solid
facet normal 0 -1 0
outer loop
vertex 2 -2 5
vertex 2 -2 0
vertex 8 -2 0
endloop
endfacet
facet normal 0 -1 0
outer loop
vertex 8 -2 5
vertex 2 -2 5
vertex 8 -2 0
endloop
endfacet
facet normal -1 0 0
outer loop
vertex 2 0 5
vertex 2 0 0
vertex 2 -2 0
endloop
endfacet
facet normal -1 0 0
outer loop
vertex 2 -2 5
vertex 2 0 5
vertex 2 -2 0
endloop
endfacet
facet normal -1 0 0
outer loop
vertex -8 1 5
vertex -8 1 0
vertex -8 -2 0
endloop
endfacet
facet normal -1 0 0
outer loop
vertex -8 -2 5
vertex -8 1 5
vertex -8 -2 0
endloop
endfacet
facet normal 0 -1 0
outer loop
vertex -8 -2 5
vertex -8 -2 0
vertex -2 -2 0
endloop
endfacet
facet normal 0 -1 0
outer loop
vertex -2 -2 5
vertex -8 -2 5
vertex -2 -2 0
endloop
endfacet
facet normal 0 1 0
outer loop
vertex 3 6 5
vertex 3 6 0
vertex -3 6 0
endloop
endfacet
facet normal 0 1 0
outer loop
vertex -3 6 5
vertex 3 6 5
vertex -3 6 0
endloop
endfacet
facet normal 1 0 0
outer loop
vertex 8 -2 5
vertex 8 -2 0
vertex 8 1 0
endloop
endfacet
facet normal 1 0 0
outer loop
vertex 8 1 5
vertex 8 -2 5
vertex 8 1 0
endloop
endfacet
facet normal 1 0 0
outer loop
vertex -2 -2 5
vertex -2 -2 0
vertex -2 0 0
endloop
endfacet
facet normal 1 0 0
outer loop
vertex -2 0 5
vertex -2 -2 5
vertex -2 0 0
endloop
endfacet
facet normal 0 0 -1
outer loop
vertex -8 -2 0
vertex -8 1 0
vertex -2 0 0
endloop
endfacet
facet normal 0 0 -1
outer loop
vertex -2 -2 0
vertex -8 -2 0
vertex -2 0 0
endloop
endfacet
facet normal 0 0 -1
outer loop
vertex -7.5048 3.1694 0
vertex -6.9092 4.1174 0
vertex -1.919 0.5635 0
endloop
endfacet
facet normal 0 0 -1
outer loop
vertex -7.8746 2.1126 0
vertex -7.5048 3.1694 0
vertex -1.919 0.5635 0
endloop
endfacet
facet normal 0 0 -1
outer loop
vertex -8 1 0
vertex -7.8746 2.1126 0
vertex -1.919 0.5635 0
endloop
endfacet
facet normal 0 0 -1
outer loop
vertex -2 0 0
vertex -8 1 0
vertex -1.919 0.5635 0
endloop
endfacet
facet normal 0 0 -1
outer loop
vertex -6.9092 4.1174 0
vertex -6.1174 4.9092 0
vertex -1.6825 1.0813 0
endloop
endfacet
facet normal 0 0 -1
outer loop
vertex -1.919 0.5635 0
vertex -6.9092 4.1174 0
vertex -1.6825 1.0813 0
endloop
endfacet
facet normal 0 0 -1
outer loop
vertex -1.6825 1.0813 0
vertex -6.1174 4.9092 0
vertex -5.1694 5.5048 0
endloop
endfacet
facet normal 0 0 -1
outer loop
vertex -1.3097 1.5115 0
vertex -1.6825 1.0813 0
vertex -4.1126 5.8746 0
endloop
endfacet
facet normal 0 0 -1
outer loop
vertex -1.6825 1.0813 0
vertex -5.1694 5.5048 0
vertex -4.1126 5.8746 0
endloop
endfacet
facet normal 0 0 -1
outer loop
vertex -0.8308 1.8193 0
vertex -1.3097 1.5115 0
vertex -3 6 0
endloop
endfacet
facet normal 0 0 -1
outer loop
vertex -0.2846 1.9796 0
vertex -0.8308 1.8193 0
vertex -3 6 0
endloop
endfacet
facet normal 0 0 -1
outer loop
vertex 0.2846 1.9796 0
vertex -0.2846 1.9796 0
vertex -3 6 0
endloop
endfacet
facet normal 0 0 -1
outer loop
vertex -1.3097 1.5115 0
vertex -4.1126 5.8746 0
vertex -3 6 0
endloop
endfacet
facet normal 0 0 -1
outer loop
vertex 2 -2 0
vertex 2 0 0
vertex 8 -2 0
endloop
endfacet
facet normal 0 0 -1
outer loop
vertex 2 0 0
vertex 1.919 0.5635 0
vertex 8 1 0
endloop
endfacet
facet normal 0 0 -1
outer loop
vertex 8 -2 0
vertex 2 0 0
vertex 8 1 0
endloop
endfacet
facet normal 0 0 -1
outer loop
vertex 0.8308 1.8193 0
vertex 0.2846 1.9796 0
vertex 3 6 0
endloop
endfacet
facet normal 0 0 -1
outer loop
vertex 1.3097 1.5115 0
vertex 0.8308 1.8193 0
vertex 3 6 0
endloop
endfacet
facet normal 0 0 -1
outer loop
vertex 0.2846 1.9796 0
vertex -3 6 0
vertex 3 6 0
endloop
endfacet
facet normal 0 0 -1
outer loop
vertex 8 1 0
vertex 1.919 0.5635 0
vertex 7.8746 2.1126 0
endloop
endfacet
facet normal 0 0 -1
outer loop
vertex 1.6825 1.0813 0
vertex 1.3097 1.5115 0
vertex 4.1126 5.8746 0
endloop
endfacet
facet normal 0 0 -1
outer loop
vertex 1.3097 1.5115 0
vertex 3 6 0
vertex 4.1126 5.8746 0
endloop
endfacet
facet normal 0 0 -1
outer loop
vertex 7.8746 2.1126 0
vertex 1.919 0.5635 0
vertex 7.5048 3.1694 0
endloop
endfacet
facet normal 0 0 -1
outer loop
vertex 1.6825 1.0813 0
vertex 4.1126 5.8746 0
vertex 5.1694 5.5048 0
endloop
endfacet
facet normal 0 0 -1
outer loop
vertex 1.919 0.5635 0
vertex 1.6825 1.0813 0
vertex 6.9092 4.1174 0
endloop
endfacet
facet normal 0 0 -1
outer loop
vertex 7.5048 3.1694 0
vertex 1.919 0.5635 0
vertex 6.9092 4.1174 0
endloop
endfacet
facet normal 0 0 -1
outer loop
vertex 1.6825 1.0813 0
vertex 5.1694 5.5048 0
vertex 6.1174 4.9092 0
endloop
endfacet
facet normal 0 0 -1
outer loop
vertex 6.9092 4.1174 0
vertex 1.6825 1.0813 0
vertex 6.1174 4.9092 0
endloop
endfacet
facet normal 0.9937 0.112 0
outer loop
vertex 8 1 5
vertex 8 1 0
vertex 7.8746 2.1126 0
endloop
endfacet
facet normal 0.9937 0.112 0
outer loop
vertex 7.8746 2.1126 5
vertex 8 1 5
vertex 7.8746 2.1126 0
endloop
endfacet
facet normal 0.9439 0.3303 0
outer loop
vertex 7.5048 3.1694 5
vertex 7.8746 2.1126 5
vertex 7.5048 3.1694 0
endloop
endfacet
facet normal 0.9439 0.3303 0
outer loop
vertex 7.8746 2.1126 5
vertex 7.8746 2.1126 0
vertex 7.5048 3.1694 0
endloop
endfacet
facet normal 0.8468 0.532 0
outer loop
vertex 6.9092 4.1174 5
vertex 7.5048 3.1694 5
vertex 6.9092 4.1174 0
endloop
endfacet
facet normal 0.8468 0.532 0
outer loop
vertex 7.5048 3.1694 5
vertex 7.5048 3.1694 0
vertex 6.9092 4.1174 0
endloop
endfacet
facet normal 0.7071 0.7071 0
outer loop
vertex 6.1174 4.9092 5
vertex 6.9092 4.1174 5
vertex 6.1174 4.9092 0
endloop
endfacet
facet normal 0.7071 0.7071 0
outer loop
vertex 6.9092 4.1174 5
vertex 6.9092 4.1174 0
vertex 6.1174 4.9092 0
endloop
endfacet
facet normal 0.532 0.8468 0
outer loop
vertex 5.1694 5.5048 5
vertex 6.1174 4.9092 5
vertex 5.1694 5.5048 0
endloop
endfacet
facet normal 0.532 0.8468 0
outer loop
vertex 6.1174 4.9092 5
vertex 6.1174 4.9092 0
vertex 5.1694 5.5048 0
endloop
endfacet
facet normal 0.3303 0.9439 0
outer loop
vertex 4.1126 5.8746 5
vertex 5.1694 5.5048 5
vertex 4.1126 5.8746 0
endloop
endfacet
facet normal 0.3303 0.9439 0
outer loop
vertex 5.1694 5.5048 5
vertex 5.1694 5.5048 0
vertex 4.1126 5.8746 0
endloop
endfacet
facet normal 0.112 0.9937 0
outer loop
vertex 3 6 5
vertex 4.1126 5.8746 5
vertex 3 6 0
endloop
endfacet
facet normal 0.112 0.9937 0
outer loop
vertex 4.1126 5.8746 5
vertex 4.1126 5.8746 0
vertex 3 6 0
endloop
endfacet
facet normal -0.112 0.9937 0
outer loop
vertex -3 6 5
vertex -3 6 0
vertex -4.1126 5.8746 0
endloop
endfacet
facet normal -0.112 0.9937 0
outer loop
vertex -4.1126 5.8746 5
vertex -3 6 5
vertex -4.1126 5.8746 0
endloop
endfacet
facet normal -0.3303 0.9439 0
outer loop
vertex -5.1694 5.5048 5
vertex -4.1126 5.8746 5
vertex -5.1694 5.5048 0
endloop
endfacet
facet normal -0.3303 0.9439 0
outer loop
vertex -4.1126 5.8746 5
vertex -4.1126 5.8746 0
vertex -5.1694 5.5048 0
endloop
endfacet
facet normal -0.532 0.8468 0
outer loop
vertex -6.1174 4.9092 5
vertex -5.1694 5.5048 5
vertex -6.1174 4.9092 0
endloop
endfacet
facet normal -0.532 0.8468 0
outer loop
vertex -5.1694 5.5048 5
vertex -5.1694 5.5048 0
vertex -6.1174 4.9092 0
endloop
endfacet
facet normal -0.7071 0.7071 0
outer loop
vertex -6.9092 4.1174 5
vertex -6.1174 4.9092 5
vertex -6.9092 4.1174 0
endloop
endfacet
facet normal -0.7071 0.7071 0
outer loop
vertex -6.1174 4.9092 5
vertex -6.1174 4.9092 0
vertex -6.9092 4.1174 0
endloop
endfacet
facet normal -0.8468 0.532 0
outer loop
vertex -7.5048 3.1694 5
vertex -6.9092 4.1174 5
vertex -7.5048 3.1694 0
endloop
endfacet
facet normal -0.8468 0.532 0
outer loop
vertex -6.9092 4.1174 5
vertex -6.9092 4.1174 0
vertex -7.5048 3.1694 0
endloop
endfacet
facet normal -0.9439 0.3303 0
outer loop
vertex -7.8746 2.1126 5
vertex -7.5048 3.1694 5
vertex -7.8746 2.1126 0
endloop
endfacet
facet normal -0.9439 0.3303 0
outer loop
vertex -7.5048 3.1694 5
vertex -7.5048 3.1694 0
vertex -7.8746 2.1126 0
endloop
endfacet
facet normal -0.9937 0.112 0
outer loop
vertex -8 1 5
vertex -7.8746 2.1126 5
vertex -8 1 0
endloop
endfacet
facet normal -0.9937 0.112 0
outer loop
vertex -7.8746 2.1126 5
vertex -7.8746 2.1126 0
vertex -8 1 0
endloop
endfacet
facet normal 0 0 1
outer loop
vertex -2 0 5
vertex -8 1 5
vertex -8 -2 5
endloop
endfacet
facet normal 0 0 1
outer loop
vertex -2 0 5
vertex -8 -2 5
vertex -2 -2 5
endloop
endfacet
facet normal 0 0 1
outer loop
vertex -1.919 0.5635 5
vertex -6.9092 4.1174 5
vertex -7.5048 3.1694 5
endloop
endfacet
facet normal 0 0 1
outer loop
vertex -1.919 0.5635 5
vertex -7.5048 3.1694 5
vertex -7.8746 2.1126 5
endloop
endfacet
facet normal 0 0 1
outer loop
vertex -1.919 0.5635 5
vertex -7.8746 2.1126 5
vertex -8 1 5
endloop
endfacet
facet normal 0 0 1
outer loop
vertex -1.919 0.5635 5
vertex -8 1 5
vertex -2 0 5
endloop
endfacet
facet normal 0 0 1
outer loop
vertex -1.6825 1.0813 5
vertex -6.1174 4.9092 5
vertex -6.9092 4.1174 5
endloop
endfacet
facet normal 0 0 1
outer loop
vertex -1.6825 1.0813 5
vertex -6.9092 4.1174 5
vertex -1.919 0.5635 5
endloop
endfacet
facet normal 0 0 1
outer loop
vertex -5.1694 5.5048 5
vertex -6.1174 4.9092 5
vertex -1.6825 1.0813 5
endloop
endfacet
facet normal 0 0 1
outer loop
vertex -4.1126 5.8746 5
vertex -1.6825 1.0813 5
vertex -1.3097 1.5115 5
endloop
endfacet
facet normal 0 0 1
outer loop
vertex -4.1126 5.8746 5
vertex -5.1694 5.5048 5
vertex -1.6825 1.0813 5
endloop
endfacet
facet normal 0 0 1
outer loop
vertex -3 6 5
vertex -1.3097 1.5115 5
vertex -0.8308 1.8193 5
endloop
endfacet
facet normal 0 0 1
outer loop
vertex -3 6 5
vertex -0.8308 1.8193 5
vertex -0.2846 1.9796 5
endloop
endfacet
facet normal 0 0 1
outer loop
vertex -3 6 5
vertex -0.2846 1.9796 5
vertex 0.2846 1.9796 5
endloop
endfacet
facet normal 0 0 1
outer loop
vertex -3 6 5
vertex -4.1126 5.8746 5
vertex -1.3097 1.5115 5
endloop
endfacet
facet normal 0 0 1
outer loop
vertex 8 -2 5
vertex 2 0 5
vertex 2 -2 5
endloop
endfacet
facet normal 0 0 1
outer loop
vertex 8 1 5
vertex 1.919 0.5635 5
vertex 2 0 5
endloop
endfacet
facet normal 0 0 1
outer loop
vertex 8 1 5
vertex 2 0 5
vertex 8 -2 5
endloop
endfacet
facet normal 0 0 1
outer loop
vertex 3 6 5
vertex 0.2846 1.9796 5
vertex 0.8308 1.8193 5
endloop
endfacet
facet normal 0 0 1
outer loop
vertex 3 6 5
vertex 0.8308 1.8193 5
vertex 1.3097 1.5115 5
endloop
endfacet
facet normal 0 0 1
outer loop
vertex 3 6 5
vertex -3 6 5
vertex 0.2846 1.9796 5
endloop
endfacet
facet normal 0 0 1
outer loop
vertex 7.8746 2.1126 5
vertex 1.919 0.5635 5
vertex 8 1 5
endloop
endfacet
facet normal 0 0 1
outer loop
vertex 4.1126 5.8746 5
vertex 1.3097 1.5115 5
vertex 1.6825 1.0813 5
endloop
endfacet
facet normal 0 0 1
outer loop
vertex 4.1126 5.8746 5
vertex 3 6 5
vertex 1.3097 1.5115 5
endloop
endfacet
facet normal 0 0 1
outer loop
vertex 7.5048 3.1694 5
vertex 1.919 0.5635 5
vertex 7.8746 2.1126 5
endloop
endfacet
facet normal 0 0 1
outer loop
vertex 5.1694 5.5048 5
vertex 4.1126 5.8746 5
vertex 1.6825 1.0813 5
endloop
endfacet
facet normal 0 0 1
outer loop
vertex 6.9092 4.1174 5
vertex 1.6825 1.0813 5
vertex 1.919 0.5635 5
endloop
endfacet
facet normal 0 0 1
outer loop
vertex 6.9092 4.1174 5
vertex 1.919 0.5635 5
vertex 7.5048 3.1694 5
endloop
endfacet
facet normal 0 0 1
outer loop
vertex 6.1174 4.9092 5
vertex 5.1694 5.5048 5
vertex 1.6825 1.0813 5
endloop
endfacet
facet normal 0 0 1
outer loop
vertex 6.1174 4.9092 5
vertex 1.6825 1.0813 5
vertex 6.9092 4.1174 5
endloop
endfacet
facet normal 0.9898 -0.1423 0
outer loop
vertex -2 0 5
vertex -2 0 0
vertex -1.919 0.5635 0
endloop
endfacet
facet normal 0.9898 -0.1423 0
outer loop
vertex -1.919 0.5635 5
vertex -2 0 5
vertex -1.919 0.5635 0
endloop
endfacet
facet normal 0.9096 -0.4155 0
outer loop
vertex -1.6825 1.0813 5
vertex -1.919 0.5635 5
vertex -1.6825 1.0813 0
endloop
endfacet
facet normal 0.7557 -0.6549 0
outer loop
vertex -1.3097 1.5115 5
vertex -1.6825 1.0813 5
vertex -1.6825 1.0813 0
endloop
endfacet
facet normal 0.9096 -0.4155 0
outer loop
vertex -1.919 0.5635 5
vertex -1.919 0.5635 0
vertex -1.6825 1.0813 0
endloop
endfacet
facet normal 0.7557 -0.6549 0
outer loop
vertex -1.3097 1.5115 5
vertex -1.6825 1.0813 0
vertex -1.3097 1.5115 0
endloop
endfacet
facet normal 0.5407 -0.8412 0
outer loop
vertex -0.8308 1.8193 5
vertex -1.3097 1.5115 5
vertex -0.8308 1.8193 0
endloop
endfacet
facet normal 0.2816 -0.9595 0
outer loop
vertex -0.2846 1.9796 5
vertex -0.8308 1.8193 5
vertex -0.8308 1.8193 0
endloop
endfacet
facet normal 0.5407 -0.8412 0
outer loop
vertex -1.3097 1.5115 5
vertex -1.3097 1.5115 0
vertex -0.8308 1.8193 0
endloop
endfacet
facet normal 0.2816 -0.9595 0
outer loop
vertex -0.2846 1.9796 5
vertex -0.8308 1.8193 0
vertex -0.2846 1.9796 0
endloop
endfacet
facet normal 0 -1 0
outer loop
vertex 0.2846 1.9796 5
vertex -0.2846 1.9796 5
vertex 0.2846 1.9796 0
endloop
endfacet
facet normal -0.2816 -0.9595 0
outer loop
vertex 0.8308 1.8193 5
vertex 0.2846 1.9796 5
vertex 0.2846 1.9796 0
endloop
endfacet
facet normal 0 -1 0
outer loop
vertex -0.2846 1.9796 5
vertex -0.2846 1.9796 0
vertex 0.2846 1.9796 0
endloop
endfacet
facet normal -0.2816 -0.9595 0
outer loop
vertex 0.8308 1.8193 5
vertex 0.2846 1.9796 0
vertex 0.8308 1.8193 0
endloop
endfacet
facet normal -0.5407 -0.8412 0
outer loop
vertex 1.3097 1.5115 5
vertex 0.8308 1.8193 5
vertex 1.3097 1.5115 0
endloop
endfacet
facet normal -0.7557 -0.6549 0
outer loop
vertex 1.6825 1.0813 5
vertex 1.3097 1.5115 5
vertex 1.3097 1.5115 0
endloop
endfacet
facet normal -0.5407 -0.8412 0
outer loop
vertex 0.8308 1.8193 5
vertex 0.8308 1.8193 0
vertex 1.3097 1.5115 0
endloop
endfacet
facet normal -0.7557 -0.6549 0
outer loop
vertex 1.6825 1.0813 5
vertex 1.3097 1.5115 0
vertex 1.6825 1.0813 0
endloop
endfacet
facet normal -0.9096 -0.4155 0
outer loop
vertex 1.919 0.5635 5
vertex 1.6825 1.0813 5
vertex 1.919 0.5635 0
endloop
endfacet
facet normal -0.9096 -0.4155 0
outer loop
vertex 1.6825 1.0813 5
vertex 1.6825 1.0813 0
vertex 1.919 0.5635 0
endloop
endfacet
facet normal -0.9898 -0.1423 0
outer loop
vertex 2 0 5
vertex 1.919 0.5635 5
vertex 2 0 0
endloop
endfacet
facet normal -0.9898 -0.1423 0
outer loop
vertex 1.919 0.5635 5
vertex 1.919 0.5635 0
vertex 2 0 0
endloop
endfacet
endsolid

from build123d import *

# Parameters (mm, degrees)
F1_DEPTH = 5


with BuildPart() as f1:
    # F0 (on Top) → F1 (new body)
    with BuildSketch(Plane.XY):
        with BuildLine():
            ThreePointArc((-2, 0), (0, 2), (2, 0))
            Line((2, 0), (2, -2))
            Line((2, -2), (8, -2))
            Line((8, -2), (8, 1))
            ThreePointArc((8, 1), (6.535534, 4.535534), (3, 6))
            Line((3, 6), (-3, 6))
            ThreePointArc((-3, 6), (-6.535534, 4.535534), (-8, 1))
            Line((-8, 1), (-8, -2))
            Line((-8, -2), (-2, -2))
            Line((-2, -2), (-2, 0))
        make_face()
    extrude(amount=F1_DEPTH)


solid = f1.part
